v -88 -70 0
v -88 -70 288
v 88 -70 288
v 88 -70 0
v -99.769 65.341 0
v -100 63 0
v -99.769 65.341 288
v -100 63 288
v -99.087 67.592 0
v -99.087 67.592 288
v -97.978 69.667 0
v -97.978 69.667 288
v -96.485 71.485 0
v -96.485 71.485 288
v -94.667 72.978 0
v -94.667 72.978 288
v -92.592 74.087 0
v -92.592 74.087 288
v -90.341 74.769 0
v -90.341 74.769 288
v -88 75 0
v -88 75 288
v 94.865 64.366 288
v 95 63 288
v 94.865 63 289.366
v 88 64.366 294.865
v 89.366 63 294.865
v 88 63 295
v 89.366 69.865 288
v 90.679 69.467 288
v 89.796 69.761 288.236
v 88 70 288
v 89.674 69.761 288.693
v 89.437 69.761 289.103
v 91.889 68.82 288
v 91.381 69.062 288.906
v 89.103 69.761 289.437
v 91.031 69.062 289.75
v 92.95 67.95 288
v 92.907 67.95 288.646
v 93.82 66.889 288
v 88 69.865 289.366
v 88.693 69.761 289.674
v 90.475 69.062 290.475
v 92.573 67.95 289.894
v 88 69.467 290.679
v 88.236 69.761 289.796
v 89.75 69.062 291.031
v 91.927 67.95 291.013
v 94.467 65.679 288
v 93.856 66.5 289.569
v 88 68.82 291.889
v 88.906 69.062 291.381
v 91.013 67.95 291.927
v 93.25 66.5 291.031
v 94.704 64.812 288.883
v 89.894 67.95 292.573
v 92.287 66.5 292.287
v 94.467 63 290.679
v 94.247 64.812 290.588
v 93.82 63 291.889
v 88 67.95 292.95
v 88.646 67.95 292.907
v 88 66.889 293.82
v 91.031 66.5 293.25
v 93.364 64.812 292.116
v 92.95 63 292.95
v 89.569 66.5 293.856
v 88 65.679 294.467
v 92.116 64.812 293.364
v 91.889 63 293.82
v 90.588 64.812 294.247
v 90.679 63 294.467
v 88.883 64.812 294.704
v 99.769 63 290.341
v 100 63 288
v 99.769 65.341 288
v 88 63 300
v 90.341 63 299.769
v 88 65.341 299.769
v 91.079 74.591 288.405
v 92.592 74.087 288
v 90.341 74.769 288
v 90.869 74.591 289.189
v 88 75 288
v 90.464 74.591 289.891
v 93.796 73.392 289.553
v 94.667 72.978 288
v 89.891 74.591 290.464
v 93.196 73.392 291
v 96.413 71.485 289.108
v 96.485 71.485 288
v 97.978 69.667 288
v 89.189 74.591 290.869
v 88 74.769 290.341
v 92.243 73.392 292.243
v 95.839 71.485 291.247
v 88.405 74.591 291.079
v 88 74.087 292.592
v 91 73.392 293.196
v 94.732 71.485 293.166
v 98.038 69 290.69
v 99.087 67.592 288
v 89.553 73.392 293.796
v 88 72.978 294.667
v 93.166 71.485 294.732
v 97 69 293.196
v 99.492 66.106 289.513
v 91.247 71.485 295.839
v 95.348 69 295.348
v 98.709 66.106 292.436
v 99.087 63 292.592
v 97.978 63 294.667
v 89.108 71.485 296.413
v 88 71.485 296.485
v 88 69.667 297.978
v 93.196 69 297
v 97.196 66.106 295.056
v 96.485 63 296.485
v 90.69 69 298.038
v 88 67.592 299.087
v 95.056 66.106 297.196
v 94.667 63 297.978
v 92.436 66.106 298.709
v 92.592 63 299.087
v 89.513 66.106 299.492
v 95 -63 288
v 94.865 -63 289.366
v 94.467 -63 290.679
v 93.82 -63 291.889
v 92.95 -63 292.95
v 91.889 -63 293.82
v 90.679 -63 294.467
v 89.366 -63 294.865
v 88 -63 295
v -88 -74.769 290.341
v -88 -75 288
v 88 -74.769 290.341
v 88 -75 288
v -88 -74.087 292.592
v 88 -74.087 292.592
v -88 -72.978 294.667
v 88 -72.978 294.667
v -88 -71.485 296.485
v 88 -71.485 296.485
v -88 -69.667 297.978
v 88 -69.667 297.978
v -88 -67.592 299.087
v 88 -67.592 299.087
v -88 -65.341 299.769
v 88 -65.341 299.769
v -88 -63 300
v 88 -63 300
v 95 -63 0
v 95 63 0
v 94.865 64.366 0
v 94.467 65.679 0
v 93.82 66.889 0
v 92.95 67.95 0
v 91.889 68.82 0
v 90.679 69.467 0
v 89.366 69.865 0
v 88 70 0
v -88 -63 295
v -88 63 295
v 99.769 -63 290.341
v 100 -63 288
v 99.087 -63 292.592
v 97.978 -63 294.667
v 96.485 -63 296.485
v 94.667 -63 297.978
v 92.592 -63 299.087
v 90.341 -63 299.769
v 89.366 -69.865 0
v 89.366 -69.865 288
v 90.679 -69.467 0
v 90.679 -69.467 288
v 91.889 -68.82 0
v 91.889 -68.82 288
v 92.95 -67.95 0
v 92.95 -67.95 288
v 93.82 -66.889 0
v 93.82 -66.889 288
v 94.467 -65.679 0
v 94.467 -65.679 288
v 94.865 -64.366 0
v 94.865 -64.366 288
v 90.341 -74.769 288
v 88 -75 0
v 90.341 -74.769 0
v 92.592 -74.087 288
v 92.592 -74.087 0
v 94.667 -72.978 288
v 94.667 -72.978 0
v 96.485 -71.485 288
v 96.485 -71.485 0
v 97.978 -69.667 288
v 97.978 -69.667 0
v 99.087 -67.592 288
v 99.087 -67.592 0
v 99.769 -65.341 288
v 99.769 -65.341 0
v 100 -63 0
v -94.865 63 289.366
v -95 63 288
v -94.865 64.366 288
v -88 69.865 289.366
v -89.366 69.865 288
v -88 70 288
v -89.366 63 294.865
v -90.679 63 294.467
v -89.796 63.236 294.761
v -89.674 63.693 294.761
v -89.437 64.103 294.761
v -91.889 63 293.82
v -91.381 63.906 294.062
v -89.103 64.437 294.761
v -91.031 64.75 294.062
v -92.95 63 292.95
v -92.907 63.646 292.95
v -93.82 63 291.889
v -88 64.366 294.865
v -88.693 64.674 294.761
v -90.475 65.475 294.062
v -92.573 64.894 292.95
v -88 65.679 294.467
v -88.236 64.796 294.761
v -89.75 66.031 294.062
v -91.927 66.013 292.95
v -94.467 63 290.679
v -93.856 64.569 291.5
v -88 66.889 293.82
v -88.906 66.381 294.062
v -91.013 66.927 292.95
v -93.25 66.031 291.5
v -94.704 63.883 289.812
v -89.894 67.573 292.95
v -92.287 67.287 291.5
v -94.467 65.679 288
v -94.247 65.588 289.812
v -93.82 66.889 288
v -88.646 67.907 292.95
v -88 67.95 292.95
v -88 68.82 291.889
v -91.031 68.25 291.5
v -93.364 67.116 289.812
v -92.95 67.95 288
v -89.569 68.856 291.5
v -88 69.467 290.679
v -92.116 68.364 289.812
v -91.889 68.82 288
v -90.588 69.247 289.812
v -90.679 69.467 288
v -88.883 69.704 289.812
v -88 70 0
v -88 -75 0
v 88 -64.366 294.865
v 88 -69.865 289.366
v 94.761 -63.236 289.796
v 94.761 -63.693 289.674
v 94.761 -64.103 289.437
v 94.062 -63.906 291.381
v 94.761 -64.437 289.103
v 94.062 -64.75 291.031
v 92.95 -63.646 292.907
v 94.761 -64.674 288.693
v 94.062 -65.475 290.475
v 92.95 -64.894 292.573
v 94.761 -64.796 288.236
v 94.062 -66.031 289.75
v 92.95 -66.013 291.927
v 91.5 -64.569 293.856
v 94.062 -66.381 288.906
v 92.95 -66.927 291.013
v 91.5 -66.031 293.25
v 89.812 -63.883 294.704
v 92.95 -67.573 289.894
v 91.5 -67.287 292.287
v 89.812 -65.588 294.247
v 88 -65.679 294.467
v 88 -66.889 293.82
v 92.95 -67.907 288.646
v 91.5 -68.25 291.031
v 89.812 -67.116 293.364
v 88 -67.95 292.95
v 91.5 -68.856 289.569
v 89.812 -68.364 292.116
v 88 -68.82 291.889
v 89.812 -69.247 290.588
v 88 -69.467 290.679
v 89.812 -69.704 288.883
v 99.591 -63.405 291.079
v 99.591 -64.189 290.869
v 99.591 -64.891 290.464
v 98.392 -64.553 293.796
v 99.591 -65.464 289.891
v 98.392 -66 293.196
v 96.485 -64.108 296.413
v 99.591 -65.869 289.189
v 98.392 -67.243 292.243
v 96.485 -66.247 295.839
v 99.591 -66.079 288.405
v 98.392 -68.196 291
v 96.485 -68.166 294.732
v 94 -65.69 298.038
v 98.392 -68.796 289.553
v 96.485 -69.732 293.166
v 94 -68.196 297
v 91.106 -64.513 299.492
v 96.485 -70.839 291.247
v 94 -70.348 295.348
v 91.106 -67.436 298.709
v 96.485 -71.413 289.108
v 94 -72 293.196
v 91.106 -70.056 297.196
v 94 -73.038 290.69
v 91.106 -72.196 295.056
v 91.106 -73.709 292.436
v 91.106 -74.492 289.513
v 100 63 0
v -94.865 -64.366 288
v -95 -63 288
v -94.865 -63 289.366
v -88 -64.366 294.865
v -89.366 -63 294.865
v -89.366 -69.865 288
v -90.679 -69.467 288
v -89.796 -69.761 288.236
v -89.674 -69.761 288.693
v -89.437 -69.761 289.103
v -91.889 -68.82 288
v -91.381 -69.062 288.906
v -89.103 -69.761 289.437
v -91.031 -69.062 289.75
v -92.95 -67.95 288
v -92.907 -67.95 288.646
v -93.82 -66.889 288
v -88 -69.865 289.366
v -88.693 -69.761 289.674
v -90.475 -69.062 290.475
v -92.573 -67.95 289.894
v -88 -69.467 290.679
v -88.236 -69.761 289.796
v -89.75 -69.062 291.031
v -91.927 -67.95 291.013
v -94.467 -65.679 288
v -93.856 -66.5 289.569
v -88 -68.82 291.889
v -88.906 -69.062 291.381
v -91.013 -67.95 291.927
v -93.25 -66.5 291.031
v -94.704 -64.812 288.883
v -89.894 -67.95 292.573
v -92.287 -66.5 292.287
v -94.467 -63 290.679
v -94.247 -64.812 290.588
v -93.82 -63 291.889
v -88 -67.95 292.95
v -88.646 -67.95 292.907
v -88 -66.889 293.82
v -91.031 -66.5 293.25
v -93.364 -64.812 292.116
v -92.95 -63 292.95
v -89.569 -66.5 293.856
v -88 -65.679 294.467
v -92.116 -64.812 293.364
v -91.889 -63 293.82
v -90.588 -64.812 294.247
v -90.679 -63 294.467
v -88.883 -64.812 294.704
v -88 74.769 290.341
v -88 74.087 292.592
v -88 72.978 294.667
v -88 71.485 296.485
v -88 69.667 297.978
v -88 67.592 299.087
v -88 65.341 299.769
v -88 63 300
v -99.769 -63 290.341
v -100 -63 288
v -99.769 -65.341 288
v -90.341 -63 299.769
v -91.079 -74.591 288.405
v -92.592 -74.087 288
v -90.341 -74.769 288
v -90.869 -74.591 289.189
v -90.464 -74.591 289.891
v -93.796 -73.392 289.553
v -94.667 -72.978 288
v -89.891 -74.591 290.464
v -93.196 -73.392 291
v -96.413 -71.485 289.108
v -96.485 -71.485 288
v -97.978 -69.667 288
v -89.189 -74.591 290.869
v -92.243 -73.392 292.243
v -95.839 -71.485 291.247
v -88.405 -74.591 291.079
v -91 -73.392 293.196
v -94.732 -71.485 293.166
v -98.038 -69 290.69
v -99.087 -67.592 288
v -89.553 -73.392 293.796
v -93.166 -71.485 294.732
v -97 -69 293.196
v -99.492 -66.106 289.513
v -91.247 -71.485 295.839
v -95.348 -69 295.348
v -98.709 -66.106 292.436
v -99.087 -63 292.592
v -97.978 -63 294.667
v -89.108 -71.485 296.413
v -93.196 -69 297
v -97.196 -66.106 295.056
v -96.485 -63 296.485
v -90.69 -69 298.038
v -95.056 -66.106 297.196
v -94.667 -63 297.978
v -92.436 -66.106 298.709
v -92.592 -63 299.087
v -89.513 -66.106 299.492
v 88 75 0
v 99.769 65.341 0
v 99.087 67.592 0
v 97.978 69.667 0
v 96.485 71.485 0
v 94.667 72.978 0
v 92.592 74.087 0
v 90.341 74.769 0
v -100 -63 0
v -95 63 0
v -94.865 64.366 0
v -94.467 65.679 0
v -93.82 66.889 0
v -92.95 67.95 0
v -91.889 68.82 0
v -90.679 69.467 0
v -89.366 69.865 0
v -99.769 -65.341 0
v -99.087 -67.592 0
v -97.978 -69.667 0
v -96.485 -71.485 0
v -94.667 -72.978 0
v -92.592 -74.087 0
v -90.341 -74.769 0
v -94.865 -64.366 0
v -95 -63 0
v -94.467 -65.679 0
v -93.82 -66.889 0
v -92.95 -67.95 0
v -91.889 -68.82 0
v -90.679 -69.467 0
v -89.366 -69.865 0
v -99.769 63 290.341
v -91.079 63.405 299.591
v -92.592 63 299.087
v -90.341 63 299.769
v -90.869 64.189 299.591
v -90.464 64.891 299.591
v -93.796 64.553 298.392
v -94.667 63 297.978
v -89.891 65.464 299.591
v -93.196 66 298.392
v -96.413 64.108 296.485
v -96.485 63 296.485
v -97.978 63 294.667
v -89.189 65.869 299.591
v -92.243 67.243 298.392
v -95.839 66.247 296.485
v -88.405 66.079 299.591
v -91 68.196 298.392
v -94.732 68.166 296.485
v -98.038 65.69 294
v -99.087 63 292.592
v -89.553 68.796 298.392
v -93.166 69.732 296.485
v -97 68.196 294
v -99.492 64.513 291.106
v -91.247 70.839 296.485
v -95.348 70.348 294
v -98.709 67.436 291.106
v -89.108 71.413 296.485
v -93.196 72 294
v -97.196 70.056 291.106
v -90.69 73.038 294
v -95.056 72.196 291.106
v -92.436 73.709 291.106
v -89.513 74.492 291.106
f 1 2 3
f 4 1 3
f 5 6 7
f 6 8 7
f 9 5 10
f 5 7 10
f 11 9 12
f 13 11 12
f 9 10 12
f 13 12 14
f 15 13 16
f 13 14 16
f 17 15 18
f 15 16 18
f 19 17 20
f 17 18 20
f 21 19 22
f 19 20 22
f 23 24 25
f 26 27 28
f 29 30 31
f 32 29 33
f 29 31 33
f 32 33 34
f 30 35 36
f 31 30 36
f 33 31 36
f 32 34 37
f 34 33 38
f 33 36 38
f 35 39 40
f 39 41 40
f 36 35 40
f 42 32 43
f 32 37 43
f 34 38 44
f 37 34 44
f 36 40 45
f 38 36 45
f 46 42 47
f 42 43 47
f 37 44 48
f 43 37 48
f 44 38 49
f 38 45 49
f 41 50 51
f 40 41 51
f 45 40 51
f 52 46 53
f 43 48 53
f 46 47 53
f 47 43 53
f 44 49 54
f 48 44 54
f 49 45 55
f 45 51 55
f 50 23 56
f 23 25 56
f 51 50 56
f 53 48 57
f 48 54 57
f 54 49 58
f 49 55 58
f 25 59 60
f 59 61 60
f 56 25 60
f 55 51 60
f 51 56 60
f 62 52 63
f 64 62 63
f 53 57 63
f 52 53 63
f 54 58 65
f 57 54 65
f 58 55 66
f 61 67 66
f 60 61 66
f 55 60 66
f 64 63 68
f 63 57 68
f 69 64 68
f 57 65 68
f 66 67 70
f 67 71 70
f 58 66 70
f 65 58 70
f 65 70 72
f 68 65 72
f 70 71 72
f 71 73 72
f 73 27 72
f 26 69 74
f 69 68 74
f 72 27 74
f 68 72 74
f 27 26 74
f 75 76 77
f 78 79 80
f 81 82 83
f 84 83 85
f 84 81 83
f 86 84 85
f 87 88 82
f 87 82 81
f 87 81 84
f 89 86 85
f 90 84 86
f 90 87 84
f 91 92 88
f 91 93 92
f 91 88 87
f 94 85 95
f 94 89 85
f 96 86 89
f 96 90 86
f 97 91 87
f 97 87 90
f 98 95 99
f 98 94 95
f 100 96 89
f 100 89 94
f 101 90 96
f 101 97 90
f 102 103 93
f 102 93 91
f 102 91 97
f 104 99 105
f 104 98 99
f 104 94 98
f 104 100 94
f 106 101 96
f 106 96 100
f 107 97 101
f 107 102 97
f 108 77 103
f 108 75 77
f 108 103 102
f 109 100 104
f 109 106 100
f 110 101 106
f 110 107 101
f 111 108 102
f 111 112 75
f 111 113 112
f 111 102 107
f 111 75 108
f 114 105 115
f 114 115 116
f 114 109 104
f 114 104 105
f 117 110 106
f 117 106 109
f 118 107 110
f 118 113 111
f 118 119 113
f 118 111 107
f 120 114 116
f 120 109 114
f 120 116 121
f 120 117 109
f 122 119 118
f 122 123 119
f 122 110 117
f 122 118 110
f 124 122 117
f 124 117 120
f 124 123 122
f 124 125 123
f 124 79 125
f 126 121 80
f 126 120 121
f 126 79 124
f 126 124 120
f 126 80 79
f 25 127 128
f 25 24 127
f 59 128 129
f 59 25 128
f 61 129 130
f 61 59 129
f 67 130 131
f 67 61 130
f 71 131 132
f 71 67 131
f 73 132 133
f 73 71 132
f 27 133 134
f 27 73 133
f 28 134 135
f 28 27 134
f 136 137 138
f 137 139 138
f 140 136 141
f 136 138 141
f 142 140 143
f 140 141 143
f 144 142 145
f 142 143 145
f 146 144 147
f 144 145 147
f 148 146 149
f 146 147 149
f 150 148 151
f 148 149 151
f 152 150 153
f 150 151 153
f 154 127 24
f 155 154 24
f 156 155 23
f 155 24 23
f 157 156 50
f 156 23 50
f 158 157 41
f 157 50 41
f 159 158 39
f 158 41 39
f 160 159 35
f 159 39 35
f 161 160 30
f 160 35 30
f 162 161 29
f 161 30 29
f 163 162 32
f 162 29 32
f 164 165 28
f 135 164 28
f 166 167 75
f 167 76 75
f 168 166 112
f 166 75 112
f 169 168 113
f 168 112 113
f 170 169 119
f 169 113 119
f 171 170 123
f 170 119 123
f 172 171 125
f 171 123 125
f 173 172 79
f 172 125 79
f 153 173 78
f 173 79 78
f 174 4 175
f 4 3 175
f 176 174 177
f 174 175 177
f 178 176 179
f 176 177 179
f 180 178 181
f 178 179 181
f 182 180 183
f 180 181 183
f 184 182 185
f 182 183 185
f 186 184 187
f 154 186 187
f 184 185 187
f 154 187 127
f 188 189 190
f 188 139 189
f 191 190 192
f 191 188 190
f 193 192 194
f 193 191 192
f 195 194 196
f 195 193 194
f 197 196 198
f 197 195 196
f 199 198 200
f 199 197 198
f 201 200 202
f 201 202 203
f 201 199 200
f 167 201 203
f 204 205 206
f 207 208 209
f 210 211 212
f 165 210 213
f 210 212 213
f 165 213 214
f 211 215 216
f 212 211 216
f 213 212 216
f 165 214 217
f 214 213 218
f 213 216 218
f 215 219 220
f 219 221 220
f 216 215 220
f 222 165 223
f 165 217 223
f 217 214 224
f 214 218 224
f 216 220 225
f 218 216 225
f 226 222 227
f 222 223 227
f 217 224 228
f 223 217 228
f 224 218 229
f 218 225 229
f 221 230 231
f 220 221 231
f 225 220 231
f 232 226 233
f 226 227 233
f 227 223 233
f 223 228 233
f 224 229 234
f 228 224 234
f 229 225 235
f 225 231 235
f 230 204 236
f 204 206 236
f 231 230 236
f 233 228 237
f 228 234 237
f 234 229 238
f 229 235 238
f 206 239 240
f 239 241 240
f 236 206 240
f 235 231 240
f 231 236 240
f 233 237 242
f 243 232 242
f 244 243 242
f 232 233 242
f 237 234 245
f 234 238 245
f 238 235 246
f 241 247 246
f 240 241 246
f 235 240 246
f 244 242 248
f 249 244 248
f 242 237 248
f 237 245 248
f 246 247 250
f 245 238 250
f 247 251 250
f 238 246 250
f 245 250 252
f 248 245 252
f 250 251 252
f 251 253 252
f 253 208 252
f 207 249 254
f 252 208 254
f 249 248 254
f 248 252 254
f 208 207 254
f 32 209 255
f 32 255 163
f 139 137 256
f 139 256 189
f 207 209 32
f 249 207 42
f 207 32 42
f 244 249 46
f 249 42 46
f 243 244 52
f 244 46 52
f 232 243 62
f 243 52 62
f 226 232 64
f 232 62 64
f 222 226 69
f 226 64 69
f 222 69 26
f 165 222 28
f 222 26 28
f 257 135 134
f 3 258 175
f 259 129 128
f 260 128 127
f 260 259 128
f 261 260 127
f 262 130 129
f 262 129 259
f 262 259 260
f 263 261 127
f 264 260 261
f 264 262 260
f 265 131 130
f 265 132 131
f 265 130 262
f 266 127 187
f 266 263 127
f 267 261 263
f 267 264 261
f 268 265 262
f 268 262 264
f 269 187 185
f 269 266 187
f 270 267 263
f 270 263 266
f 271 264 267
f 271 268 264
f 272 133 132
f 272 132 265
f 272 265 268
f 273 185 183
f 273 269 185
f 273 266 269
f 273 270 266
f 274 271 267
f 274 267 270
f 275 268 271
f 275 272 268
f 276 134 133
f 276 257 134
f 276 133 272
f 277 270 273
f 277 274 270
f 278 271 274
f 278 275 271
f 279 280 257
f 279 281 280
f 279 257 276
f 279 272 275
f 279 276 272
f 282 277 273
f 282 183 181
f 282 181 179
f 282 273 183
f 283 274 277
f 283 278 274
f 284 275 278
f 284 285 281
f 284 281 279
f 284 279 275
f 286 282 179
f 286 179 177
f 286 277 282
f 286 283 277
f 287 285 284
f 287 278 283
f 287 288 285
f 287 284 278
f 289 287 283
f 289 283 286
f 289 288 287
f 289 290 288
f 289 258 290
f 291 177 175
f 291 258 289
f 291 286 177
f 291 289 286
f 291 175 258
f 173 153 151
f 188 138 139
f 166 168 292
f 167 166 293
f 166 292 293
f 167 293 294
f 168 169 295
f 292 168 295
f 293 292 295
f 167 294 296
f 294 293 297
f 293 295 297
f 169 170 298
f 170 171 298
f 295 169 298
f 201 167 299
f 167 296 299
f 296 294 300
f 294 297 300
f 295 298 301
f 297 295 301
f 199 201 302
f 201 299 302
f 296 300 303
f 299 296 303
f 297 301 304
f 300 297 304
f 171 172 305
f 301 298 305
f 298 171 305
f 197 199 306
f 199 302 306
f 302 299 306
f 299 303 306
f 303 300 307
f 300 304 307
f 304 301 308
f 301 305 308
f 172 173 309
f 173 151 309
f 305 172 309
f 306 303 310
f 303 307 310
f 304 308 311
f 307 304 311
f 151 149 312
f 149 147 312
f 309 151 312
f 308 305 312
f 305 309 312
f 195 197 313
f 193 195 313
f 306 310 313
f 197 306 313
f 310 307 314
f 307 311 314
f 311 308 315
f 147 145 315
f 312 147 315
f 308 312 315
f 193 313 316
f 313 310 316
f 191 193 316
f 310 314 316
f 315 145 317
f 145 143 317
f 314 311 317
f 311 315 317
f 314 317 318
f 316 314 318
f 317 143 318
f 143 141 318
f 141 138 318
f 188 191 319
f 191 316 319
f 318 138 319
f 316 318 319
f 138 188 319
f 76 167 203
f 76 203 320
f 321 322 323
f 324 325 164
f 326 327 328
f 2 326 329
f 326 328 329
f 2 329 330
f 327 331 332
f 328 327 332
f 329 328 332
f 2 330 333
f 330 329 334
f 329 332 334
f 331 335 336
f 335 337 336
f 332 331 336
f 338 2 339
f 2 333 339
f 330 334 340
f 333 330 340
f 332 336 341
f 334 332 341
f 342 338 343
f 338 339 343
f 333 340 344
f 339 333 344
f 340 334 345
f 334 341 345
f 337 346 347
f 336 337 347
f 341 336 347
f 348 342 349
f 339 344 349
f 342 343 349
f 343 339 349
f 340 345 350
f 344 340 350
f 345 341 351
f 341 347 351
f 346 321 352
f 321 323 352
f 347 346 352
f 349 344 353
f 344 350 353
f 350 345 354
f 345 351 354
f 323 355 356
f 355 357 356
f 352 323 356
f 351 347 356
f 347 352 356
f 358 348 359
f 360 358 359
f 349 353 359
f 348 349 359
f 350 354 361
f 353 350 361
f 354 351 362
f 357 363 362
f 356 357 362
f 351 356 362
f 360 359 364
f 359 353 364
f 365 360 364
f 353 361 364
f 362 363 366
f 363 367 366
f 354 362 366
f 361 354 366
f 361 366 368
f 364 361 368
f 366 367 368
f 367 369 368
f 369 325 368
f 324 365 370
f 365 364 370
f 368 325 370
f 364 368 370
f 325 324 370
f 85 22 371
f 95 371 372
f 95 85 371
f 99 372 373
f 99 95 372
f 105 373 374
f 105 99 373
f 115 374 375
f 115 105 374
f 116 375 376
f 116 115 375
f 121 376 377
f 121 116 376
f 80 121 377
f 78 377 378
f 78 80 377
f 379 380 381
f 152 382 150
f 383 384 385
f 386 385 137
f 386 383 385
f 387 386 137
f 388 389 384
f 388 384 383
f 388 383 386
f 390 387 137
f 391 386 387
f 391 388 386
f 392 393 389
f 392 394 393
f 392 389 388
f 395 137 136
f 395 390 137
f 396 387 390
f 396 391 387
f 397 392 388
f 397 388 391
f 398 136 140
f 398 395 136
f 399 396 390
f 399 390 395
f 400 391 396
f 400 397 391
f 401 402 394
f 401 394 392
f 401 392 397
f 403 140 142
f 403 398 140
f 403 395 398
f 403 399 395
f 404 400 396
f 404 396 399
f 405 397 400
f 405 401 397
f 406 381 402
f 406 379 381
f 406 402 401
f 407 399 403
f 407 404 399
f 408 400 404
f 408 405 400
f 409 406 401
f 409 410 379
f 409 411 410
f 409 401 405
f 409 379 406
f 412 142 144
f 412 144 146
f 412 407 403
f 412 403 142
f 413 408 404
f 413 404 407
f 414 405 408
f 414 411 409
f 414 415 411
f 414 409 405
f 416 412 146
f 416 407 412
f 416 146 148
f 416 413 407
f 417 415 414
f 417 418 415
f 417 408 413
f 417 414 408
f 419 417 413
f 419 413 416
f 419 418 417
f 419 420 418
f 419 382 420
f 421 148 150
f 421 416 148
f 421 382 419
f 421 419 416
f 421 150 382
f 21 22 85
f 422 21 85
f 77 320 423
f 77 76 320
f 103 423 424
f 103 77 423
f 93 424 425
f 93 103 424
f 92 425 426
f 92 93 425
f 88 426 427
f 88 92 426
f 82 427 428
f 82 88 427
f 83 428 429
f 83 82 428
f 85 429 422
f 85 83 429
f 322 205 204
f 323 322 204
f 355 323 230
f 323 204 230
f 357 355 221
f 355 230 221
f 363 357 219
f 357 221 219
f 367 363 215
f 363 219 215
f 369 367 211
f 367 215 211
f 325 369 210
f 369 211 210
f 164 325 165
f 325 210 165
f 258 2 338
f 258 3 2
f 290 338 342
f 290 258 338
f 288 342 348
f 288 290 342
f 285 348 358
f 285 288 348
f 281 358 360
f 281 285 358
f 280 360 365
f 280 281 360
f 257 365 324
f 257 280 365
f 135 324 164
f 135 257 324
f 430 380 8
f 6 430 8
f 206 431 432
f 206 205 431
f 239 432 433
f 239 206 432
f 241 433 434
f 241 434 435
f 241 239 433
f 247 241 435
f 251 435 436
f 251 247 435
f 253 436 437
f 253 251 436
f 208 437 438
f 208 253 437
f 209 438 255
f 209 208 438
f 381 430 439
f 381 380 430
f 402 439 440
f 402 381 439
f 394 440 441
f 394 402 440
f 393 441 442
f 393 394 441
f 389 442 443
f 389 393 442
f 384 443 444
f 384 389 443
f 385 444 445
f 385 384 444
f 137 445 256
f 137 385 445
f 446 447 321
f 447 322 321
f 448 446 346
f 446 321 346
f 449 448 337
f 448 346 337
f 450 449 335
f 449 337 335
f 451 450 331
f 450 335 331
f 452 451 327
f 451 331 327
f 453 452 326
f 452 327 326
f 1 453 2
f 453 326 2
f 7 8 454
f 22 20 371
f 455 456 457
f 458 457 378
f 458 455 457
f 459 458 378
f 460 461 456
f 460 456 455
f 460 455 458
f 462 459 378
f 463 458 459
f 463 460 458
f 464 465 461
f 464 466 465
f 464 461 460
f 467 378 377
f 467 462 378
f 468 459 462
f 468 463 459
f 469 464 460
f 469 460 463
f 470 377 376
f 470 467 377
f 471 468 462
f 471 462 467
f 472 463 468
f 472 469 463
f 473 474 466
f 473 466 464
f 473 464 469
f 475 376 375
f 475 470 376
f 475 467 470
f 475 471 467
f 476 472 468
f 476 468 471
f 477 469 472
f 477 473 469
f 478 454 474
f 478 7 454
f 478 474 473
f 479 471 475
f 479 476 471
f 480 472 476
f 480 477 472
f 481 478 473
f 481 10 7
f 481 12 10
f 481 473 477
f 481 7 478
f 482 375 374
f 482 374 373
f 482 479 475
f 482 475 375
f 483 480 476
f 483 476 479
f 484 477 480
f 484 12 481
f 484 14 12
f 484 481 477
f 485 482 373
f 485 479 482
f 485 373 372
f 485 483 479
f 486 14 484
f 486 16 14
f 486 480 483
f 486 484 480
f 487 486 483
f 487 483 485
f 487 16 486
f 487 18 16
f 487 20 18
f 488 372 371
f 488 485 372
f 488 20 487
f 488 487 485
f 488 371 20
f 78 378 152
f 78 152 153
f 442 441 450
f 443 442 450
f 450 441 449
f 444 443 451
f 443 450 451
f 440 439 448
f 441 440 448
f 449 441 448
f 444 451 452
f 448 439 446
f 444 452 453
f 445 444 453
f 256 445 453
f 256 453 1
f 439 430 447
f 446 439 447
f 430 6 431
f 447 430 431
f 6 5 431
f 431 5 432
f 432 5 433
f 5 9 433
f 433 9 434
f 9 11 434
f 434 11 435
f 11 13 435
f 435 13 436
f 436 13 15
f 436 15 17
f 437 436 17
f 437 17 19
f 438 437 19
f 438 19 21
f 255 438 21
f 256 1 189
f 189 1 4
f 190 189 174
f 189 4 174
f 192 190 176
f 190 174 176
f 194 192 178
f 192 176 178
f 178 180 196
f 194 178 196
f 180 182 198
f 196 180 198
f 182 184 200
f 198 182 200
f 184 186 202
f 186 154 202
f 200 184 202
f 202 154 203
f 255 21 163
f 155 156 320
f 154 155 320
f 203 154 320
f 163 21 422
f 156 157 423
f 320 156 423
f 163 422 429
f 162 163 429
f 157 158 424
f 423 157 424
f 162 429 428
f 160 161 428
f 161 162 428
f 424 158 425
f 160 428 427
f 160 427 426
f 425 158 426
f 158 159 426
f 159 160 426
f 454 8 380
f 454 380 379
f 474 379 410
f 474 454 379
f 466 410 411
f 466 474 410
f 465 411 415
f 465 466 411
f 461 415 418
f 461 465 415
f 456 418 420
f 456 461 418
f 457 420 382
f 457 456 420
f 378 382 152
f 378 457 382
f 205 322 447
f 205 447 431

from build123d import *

# Parameters (mm, degrees)
F0_W     = 200
F0_H     = 150
F1_DEPTH = 300
F2_R     = 12
F3_T     = -5


with BuildPart() as f1:
    # F0 (on Top) → F1 (new body)
    with BuildSketch(Plane.XY):
        Rectangle(F0_W, F0_H)
    extrude(amount=F1_DEPTH)

    # F2
    f2_edges = [f1.edges().sort_by_distance(p)[0] for p in [
        (-100, 75, 150),
        (-100, 0, 300),
        (-100, -75, 150),
        (0, -75, 300),
        (100, 0, 300),
        (100, -75, 150),
        (100, 75, 150),
        (0, 75, 300),
    ]]
    fillet(f2_edges, radius=F2_R)

    # F3
    f3_openings = [f1.faces().sort_by_distance(p)[0] for p in [
        (0, 0, 0),
    ]]
    offset(amount=F3_T, openings=f3_openings)


solid = f1.part
